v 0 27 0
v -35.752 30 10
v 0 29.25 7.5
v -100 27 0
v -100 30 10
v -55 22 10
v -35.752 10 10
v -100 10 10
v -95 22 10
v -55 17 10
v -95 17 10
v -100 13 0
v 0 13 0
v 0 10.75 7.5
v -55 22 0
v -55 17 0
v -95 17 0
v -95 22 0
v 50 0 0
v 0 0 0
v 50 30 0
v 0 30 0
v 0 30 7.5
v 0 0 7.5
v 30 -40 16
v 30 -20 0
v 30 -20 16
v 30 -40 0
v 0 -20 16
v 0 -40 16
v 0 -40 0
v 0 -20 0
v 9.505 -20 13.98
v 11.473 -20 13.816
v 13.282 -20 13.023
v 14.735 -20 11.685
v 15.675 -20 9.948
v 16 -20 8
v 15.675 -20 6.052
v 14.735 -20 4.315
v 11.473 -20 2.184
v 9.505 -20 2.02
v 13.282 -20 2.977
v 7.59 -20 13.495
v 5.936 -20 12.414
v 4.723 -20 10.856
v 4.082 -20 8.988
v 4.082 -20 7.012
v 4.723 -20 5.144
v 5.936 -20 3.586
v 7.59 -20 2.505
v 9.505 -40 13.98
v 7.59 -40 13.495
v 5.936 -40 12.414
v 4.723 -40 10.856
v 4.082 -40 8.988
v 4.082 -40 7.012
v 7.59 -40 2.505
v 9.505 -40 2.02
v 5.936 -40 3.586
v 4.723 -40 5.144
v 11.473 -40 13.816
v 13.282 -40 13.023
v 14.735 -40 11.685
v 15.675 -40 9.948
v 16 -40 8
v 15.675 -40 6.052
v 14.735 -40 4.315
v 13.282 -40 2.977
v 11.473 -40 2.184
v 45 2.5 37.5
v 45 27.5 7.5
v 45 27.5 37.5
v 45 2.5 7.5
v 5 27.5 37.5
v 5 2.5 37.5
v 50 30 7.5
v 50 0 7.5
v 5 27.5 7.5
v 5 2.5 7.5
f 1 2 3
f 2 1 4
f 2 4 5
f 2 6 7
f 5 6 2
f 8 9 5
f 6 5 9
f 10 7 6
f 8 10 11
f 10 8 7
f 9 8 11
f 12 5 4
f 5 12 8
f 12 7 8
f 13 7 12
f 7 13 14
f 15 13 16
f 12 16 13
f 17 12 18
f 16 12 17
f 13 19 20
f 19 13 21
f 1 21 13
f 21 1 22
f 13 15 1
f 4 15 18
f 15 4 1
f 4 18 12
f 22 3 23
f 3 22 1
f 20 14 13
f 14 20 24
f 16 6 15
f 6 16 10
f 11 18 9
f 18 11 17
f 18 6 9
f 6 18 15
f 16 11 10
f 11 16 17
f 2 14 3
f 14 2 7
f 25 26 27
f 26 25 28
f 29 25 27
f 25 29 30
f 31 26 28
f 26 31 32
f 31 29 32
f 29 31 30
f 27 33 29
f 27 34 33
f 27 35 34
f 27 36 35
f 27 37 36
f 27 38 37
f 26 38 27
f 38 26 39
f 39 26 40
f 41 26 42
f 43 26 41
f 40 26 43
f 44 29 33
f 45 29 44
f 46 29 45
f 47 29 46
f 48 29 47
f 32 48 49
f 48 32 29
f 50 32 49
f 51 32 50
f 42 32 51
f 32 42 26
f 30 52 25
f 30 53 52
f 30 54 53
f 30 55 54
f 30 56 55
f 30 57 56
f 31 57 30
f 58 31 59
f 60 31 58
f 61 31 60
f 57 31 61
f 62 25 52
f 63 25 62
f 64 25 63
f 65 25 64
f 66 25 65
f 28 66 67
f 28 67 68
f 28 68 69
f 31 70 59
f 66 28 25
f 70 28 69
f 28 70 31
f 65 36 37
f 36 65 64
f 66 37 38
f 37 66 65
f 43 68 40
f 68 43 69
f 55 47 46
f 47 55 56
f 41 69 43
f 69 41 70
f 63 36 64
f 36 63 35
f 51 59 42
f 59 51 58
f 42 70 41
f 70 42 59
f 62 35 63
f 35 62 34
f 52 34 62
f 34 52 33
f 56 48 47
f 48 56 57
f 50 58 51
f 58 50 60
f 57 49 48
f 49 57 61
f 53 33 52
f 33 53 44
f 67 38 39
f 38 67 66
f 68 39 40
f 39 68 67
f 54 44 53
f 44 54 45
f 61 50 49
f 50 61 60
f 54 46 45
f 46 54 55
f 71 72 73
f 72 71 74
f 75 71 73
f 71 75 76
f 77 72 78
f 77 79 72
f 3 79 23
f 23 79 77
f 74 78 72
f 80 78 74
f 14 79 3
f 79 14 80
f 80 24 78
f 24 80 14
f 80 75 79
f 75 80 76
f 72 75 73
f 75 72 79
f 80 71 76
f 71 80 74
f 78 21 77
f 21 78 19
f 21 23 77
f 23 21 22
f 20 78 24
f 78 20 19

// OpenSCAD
cam_x = 40;
cam_y = 25;

translate([5,2.5,7.5]) color("red") cube([cam_x,cam_y,30]);

cube([cam_x+10,cam_y+5,7.5]);

paths = [[0,0],[3,10],[17,10],[20,0]];
difference(){
    color("green") rotate([-90,0,90]) translate([10,-10,50]){
        linear_extrude(height = 100, center = true, convexity = 14, twist = 0) 
        polygon(paths);
    }
    color("blue") translate([-95,17,-5]) cube([40,5,17]);
    color("purple") translate([0,7,7.5])rotate([0,-86,0]) cube([5,25,40]);
}

translate([0,-40,0]){
    difference(){
        cube([30,20,16]);
        translate([10,25,8])rotate([90,0,0])cylinder(30,6,6);
    }
}
